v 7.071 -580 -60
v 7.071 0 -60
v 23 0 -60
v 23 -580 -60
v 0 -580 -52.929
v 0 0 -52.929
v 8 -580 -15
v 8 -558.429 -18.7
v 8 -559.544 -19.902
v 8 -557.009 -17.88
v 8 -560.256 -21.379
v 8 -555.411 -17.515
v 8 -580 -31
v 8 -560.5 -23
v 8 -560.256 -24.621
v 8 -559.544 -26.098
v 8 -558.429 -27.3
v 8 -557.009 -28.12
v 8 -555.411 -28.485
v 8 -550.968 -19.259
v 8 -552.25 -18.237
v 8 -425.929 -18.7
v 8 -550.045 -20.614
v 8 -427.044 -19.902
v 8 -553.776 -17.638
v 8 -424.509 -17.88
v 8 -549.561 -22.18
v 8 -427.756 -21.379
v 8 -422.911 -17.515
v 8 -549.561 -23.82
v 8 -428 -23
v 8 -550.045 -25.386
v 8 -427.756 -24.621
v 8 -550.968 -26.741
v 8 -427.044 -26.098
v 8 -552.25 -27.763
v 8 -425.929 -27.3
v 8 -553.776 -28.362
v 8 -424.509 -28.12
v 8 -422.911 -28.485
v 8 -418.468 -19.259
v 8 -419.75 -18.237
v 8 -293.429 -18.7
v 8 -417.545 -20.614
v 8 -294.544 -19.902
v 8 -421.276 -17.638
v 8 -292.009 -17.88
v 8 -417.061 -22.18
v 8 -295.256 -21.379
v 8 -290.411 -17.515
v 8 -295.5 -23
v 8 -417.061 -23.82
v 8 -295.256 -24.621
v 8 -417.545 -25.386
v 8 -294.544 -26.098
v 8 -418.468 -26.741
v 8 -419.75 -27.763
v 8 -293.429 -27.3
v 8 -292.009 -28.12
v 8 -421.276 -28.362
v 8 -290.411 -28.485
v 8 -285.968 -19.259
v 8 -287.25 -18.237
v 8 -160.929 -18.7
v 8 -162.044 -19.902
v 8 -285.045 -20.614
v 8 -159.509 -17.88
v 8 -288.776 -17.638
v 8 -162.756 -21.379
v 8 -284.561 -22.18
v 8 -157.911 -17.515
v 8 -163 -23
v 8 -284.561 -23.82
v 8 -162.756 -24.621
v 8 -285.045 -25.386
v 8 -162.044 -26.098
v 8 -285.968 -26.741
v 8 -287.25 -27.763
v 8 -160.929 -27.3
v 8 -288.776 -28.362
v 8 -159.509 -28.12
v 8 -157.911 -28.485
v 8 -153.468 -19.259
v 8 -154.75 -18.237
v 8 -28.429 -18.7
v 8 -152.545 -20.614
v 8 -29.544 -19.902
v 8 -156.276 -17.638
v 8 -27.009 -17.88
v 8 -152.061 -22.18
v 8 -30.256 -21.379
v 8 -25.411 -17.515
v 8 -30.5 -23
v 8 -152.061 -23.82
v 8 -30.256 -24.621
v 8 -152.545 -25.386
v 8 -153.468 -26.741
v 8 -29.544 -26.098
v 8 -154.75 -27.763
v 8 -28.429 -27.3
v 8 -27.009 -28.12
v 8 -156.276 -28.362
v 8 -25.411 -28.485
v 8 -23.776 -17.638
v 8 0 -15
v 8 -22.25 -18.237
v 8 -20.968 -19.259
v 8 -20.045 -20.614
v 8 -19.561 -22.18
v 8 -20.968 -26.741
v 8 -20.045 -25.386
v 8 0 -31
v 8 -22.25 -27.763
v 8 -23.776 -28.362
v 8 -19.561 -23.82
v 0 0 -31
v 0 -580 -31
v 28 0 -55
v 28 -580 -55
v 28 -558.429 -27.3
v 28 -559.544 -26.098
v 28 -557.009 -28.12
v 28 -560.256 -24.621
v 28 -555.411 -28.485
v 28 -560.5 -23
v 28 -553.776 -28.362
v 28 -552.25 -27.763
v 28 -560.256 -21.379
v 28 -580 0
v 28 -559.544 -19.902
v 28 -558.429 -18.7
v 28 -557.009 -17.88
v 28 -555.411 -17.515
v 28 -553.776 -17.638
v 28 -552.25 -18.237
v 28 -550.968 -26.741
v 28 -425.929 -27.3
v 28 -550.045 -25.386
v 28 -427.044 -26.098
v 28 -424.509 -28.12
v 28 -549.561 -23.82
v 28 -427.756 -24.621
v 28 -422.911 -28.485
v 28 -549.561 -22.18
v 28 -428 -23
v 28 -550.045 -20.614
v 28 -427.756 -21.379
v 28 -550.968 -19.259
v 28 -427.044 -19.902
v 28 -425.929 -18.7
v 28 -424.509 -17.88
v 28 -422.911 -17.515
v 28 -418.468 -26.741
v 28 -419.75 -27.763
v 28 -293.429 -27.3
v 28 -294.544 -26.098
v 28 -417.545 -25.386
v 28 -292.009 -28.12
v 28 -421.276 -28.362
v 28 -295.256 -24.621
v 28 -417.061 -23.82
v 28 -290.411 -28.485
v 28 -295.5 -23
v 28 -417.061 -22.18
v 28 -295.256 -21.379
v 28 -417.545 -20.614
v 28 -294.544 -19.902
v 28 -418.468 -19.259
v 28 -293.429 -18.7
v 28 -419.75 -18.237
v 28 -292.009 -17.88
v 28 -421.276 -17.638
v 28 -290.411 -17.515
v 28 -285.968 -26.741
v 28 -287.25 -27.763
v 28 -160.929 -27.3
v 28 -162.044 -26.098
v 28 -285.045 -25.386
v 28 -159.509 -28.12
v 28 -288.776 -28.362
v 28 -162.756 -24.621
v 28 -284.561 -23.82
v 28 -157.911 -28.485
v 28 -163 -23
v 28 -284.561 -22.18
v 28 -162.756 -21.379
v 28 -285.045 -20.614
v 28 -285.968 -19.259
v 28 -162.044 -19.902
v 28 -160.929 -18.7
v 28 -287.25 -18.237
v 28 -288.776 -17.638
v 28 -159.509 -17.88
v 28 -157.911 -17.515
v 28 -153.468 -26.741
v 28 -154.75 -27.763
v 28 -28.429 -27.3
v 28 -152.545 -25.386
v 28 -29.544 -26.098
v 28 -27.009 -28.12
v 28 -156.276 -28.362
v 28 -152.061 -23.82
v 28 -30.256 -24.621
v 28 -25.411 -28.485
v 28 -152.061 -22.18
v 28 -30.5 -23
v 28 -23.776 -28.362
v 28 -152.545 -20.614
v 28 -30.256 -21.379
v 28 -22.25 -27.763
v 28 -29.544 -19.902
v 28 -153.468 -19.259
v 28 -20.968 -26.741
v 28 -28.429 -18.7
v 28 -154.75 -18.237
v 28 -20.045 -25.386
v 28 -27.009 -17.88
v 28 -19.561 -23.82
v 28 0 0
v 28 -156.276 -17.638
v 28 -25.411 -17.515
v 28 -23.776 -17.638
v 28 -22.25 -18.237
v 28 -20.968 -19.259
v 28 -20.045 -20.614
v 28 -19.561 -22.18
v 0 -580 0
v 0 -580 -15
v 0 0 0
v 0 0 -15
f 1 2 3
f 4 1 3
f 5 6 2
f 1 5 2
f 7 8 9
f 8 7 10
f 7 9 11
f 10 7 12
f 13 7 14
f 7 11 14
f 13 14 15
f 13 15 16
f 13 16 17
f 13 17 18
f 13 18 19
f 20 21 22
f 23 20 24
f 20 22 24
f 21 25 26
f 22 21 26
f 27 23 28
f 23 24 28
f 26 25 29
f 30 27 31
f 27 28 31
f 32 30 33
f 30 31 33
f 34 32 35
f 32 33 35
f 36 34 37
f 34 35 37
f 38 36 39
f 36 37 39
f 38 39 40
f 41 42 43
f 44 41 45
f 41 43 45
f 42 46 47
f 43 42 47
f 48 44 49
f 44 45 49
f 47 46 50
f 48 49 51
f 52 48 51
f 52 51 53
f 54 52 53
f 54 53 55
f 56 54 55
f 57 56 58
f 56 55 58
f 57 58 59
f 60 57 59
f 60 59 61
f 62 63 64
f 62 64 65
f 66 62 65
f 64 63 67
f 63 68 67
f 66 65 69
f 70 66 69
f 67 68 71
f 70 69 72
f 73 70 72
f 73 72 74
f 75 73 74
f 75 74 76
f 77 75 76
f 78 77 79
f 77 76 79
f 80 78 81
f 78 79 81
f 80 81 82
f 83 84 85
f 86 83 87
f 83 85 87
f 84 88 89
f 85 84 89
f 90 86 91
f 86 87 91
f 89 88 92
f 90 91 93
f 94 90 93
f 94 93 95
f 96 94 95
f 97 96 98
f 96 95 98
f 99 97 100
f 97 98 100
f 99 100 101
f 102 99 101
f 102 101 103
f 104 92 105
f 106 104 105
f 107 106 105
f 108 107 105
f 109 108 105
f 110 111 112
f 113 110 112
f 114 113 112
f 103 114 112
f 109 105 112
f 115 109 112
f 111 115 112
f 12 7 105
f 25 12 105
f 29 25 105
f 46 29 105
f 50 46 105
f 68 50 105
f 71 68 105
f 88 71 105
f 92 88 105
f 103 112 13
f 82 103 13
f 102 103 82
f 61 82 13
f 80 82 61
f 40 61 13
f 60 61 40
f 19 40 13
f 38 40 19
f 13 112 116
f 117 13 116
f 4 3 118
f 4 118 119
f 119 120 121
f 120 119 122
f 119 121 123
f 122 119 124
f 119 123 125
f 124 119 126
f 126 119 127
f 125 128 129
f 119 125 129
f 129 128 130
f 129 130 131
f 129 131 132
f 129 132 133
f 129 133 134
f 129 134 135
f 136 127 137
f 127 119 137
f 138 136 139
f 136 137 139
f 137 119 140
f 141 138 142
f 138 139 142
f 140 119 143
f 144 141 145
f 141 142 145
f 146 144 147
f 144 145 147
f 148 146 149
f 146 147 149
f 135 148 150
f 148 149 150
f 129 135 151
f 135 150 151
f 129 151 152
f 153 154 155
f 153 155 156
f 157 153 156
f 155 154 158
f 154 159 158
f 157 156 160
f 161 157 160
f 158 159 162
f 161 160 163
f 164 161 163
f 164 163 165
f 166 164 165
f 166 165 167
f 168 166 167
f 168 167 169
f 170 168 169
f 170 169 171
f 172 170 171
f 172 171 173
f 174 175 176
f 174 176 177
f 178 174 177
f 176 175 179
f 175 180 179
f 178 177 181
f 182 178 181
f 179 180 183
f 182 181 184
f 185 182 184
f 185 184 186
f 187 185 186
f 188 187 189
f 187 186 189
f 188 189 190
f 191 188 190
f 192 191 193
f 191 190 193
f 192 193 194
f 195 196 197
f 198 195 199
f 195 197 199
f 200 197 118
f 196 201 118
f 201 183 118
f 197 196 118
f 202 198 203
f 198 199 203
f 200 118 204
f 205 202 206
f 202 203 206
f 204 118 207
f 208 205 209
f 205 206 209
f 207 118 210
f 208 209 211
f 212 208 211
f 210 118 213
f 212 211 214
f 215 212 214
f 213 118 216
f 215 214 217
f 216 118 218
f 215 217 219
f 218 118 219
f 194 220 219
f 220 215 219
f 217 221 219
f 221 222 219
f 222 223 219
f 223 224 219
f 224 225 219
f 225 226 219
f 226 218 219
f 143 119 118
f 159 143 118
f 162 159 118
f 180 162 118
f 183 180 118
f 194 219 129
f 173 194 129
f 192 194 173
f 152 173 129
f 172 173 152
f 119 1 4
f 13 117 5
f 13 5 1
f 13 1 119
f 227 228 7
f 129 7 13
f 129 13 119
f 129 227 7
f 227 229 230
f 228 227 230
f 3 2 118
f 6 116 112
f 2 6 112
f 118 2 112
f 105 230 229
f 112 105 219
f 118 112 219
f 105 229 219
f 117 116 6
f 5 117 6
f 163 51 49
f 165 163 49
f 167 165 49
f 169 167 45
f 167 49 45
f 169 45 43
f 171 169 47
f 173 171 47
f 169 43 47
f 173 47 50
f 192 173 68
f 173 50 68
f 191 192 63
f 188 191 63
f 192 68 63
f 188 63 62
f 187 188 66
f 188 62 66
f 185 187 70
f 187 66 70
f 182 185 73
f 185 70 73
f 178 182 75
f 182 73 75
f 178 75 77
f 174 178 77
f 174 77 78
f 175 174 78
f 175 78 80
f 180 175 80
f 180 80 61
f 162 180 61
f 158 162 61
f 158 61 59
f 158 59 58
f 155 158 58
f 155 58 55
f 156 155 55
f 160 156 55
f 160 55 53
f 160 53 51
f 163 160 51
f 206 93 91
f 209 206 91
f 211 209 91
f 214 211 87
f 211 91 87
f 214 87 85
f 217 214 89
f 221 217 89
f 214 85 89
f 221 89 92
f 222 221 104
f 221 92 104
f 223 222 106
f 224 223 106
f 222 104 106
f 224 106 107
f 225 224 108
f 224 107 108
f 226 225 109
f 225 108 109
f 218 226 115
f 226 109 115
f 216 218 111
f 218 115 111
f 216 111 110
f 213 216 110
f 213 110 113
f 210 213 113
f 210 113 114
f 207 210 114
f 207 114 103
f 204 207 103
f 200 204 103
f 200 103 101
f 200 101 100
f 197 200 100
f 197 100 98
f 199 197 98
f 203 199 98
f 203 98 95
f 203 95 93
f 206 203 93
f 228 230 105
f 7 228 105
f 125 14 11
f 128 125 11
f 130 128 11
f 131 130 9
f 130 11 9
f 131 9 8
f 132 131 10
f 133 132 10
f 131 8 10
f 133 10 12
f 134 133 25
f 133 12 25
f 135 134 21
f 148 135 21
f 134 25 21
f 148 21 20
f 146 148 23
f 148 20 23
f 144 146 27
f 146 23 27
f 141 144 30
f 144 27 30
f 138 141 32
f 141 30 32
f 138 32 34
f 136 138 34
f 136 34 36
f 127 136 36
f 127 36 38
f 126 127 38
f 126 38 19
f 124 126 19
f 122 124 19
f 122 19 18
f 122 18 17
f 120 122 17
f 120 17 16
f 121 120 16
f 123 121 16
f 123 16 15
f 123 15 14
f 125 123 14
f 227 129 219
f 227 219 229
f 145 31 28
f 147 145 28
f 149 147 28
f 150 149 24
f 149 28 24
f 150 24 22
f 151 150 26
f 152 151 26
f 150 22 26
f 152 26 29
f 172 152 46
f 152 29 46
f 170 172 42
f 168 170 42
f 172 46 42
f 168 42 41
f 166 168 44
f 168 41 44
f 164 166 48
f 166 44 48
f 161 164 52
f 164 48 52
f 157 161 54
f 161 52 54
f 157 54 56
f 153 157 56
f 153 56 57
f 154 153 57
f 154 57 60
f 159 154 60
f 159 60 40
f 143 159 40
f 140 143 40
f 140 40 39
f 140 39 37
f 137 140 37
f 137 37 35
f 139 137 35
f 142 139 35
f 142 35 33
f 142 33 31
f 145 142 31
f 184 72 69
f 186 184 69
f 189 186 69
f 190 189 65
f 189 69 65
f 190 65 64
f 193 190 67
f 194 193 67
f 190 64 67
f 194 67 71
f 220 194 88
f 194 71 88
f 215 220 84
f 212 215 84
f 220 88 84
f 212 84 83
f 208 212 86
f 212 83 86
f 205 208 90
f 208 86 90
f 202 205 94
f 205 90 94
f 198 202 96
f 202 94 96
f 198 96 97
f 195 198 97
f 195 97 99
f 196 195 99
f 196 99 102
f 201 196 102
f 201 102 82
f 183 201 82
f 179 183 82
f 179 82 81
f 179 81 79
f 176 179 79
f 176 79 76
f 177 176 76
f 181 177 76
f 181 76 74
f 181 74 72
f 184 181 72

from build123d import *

# Parameters (mm, degrees)
F1_DEPTH = 580
F3_D     = 11
F4_SIZE  = 5


with BuildPart() as f1:
    # F0 (on Front) → F1 (new body)
    with BuildSketch(Plane.XZ):
        Polygon((28, 0), (0, 0), (0, -15), (8, -15), (8, -31), (0, -31), (0, -52.9289321881), (7.0710678119, -60), (28, -60), align=None)
    extrude(amount=F1_DEPTH)

    # F3 (through all)
    with Locations(Plane.YZ.offset(28)):
        with Locations((-555, -23), (-422.5, -23), (-290, -23), (-157.5, -23), (-25, -23)):
            Hole(F3_D / 2)

    # F4
    f4_edges = [f1.edges().sort_by_distance(p)[0] for p in [
        (28, -290, -60),
    ]]
    chamfer(f4_edges, length=F4_SIZE)


solid = f1.part
